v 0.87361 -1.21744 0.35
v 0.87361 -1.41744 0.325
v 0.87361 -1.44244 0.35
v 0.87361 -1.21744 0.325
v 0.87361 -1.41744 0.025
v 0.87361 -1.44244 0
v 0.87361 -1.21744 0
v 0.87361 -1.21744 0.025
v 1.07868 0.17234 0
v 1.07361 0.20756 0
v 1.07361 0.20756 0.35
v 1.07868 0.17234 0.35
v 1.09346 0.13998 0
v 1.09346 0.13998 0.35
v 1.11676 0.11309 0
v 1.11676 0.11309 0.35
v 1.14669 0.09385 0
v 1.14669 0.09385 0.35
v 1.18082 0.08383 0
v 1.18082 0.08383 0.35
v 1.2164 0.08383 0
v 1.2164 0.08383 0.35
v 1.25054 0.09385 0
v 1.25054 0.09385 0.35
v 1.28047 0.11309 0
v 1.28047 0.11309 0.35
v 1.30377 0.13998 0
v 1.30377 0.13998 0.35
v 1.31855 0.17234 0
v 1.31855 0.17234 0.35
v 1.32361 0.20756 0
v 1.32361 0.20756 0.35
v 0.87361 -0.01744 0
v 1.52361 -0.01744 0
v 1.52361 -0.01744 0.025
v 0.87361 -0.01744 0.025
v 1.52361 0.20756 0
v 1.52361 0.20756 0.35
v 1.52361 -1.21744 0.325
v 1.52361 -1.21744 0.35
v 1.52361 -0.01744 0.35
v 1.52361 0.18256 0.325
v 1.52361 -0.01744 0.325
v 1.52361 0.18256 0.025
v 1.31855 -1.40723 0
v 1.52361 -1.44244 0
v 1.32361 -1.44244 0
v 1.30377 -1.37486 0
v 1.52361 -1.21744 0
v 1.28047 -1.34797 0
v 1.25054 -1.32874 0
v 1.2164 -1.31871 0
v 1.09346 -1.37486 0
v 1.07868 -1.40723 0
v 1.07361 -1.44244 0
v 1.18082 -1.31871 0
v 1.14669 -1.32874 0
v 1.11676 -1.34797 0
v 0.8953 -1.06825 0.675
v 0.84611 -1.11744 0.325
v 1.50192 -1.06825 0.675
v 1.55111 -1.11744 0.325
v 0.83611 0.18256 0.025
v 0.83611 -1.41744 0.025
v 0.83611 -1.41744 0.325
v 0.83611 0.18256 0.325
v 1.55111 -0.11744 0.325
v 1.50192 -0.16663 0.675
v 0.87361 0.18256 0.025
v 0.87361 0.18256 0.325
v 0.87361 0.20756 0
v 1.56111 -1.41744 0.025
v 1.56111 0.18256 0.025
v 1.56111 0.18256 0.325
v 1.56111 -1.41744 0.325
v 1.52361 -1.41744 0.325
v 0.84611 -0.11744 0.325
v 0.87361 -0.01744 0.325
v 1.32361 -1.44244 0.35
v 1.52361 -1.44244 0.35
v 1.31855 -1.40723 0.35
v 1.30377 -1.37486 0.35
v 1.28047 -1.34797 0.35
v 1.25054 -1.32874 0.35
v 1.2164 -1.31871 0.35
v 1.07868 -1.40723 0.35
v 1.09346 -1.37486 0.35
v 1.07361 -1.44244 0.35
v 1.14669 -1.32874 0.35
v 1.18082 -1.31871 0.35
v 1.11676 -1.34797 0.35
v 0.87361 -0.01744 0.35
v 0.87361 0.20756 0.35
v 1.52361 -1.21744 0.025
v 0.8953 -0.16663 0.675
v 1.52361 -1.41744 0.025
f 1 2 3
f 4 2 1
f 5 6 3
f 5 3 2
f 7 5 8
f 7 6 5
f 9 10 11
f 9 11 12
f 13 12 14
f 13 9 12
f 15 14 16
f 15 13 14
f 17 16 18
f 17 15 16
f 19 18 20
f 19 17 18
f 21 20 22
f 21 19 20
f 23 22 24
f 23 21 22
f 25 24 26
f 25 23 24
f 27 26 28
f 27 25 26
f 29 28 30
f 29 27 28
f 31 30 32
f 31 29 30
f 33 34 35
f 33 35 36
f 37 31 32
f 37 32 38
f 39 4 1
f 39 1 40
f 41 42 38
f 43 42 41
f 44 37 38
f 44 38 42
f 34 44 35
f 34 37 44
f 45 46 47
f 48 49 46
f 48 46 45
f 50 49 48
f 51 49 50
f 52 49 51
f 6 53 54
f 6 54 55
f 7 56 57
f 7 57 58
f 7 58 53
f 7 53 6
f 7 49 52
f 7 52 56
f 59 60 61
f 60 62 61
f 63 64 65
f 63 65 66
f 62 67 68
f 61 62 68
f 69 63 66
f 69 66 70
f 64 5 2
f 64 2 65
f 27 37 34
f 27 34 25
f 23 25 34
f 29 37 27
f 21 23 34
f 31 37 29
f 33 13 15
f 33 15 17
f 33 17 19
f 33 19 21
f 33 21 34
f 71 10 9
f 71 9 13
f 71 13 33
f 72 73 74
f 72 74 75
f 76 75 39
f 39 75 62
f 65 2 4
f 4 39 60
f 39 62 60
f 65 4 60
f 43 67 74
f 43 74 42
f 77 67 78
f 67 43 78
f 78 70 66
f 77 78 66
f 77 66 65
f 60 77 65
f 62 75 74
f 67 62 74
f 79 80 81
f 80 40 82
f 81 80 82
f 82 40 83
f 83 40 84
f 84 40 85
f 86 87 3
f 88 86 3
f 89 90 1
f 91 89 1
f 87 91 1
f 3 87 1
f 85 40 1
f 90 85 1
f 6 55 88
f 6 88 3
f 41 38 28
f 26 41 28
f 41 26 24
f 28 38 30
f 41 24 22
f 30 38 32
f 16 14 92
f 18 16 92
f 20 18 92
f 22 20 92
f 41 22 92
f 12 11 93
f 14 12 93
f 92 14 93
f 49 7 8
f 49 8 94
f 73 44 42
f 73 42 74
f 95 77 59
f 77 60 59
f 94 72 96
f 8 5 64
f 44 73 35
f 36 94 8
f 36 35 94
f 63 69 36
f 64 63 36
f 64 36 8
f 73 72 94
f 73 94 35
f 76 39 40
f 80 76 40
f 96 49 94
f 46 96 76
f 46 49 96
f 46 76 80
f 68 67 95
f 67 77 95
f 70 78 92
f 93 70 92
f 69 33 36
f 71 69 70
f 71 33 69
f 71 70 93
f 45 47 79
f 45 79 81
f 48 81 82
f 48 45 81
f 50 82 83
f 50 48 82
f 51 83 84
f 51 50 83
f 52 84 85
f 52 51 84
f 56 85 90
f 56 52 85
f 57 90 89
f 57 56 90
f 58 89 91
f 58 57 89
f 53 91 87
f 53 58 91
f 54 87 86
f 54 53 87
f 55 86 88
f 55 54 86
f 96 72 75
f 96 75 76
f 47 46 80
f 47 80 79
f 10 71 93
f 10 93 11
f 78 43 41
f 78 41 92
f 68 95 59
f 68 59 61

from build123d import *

# Parameters (mm, degrees)
RESSALTO_EXTRUS_O1_DEPTH   = 0.35
RESSALTO_EXTRUS_O1_2_DEPTH = 0.35
RESSALTO_EXTRUS_O2_START   = 0.025
RESSALTO_EXTRUS_O2_DEPTH   = 0.3
ESBO_O3_W                  = 0.705
ESBO_O3_H                  = 1
RESSALTO_EXTRUS_O3_DEPTH   = 0.35
RESSALTO_EXTRUS_O3_TAPER   = 8


with BuildPart() as part:
    # Esboço1 → Ressalto-extrusão1 (new body)
    with BuildSketch(Plane.XY):
        with BuildLine():
            Line((0.873613743, 0.20755841), (1.073613743, 0.20755841))
            ThreePointArc((1.073613743, 0.20755841), (1.198613743, 0.08255841), (1.323613743, 0.20755841))
            Line((1.323613743, 0.20755841), (1.523613743, 0.20755841))
            Line((1.523613743, 0.20755841), (1.523613743, -0.01744159))
            Line((1.523613743, -0.01744159), (0.873613743, -0.01744159))
            Line((0.873613743, -0.01744159), (0.873613743, 0.20755841))
        make_face()
    extrude(amount=RESSALTO_EXTRUS_O1_DEPTH)



with BuildPart() as body_2:
    # Esboço1 → Ressalto-extrus_o1 2 (new body)
    with BuildSketch(Plane.XY):
        with BuildLine():
            Line((0.873613743, -1.21744159), (1.523613743, -1.21744159))
            Line((1.523613743, -1.21744159), (1.523613743, -1.44244159))
            Line((1.523613743, -1.44244159), (1.323613743, -1.44244159))
            ThreePointArc((1.323613743, -1.44244159), (1.198613743, -1.31744159), (1.073613743, -1.44244159))
            Line((1.073613743, -1.44244159), (0.873613743, -1.44244159))
            Line((0.873613743, -1.44244159), (0.873613743, -1.21744159))
        make_face()
    extrude(amount=RESSALTO_EXTRUS_O1_2_DEPTH)


with BuildPart() as part_1:
    add(part.part)

    add(body_2.part)  # Ressalto-extrusão2 merges body 2
    # Esboço2 → Ressalto-extrusão2 (add)
    with BuildSketch(Plane.XY.offset(RESSALTO_EXTRUS_O2_START)):
        with BuildLine():
            Line((0.836113743, 0.18255841), (1.023613743, 0.18255841))
            ThreePointArc((1.023613743, 0.18255841), (1.198613743, 0.00755841), (1.373613743, 0.18255841))
            Line((1.373613743, 0.18255841), (1.561113743, 0.18255841))
            Line((1.561113743, 0.18255841), (1.561113743, -1.41744159))
            Line((1.561113743, -1.41744159), (1.373613743, -1.41744159))
            ThreePointArc((1.373613743, -1.41744159), (1.198613743, -1.24244159), (1.023613743, -1.41744159))
            Line((1.023613743, -1.41744159), (0.836113743, -1.41744159))
            Line((0.836113743, -1.41744159), (0.836113743, 0.18255841))
        make_face()
    extrude(amount=RESSALTO_EXTRUS_O2_DEPTH)

    # Esboço3 → Ressalto-extrusão3 (add)
    with BuildSketch(Plane.XY.offset(0.325)):
        with Locations((1.198613743, -0.61744159)):
            Rectangle(ESBO_O3_W, ESBO_O3_H)
    extrude(amount=RESSALTO_EXTRUS_O3_DEPTH, taper=RESSALTO_EXTRUS_O3_TAPER)


solid = part_1.part
